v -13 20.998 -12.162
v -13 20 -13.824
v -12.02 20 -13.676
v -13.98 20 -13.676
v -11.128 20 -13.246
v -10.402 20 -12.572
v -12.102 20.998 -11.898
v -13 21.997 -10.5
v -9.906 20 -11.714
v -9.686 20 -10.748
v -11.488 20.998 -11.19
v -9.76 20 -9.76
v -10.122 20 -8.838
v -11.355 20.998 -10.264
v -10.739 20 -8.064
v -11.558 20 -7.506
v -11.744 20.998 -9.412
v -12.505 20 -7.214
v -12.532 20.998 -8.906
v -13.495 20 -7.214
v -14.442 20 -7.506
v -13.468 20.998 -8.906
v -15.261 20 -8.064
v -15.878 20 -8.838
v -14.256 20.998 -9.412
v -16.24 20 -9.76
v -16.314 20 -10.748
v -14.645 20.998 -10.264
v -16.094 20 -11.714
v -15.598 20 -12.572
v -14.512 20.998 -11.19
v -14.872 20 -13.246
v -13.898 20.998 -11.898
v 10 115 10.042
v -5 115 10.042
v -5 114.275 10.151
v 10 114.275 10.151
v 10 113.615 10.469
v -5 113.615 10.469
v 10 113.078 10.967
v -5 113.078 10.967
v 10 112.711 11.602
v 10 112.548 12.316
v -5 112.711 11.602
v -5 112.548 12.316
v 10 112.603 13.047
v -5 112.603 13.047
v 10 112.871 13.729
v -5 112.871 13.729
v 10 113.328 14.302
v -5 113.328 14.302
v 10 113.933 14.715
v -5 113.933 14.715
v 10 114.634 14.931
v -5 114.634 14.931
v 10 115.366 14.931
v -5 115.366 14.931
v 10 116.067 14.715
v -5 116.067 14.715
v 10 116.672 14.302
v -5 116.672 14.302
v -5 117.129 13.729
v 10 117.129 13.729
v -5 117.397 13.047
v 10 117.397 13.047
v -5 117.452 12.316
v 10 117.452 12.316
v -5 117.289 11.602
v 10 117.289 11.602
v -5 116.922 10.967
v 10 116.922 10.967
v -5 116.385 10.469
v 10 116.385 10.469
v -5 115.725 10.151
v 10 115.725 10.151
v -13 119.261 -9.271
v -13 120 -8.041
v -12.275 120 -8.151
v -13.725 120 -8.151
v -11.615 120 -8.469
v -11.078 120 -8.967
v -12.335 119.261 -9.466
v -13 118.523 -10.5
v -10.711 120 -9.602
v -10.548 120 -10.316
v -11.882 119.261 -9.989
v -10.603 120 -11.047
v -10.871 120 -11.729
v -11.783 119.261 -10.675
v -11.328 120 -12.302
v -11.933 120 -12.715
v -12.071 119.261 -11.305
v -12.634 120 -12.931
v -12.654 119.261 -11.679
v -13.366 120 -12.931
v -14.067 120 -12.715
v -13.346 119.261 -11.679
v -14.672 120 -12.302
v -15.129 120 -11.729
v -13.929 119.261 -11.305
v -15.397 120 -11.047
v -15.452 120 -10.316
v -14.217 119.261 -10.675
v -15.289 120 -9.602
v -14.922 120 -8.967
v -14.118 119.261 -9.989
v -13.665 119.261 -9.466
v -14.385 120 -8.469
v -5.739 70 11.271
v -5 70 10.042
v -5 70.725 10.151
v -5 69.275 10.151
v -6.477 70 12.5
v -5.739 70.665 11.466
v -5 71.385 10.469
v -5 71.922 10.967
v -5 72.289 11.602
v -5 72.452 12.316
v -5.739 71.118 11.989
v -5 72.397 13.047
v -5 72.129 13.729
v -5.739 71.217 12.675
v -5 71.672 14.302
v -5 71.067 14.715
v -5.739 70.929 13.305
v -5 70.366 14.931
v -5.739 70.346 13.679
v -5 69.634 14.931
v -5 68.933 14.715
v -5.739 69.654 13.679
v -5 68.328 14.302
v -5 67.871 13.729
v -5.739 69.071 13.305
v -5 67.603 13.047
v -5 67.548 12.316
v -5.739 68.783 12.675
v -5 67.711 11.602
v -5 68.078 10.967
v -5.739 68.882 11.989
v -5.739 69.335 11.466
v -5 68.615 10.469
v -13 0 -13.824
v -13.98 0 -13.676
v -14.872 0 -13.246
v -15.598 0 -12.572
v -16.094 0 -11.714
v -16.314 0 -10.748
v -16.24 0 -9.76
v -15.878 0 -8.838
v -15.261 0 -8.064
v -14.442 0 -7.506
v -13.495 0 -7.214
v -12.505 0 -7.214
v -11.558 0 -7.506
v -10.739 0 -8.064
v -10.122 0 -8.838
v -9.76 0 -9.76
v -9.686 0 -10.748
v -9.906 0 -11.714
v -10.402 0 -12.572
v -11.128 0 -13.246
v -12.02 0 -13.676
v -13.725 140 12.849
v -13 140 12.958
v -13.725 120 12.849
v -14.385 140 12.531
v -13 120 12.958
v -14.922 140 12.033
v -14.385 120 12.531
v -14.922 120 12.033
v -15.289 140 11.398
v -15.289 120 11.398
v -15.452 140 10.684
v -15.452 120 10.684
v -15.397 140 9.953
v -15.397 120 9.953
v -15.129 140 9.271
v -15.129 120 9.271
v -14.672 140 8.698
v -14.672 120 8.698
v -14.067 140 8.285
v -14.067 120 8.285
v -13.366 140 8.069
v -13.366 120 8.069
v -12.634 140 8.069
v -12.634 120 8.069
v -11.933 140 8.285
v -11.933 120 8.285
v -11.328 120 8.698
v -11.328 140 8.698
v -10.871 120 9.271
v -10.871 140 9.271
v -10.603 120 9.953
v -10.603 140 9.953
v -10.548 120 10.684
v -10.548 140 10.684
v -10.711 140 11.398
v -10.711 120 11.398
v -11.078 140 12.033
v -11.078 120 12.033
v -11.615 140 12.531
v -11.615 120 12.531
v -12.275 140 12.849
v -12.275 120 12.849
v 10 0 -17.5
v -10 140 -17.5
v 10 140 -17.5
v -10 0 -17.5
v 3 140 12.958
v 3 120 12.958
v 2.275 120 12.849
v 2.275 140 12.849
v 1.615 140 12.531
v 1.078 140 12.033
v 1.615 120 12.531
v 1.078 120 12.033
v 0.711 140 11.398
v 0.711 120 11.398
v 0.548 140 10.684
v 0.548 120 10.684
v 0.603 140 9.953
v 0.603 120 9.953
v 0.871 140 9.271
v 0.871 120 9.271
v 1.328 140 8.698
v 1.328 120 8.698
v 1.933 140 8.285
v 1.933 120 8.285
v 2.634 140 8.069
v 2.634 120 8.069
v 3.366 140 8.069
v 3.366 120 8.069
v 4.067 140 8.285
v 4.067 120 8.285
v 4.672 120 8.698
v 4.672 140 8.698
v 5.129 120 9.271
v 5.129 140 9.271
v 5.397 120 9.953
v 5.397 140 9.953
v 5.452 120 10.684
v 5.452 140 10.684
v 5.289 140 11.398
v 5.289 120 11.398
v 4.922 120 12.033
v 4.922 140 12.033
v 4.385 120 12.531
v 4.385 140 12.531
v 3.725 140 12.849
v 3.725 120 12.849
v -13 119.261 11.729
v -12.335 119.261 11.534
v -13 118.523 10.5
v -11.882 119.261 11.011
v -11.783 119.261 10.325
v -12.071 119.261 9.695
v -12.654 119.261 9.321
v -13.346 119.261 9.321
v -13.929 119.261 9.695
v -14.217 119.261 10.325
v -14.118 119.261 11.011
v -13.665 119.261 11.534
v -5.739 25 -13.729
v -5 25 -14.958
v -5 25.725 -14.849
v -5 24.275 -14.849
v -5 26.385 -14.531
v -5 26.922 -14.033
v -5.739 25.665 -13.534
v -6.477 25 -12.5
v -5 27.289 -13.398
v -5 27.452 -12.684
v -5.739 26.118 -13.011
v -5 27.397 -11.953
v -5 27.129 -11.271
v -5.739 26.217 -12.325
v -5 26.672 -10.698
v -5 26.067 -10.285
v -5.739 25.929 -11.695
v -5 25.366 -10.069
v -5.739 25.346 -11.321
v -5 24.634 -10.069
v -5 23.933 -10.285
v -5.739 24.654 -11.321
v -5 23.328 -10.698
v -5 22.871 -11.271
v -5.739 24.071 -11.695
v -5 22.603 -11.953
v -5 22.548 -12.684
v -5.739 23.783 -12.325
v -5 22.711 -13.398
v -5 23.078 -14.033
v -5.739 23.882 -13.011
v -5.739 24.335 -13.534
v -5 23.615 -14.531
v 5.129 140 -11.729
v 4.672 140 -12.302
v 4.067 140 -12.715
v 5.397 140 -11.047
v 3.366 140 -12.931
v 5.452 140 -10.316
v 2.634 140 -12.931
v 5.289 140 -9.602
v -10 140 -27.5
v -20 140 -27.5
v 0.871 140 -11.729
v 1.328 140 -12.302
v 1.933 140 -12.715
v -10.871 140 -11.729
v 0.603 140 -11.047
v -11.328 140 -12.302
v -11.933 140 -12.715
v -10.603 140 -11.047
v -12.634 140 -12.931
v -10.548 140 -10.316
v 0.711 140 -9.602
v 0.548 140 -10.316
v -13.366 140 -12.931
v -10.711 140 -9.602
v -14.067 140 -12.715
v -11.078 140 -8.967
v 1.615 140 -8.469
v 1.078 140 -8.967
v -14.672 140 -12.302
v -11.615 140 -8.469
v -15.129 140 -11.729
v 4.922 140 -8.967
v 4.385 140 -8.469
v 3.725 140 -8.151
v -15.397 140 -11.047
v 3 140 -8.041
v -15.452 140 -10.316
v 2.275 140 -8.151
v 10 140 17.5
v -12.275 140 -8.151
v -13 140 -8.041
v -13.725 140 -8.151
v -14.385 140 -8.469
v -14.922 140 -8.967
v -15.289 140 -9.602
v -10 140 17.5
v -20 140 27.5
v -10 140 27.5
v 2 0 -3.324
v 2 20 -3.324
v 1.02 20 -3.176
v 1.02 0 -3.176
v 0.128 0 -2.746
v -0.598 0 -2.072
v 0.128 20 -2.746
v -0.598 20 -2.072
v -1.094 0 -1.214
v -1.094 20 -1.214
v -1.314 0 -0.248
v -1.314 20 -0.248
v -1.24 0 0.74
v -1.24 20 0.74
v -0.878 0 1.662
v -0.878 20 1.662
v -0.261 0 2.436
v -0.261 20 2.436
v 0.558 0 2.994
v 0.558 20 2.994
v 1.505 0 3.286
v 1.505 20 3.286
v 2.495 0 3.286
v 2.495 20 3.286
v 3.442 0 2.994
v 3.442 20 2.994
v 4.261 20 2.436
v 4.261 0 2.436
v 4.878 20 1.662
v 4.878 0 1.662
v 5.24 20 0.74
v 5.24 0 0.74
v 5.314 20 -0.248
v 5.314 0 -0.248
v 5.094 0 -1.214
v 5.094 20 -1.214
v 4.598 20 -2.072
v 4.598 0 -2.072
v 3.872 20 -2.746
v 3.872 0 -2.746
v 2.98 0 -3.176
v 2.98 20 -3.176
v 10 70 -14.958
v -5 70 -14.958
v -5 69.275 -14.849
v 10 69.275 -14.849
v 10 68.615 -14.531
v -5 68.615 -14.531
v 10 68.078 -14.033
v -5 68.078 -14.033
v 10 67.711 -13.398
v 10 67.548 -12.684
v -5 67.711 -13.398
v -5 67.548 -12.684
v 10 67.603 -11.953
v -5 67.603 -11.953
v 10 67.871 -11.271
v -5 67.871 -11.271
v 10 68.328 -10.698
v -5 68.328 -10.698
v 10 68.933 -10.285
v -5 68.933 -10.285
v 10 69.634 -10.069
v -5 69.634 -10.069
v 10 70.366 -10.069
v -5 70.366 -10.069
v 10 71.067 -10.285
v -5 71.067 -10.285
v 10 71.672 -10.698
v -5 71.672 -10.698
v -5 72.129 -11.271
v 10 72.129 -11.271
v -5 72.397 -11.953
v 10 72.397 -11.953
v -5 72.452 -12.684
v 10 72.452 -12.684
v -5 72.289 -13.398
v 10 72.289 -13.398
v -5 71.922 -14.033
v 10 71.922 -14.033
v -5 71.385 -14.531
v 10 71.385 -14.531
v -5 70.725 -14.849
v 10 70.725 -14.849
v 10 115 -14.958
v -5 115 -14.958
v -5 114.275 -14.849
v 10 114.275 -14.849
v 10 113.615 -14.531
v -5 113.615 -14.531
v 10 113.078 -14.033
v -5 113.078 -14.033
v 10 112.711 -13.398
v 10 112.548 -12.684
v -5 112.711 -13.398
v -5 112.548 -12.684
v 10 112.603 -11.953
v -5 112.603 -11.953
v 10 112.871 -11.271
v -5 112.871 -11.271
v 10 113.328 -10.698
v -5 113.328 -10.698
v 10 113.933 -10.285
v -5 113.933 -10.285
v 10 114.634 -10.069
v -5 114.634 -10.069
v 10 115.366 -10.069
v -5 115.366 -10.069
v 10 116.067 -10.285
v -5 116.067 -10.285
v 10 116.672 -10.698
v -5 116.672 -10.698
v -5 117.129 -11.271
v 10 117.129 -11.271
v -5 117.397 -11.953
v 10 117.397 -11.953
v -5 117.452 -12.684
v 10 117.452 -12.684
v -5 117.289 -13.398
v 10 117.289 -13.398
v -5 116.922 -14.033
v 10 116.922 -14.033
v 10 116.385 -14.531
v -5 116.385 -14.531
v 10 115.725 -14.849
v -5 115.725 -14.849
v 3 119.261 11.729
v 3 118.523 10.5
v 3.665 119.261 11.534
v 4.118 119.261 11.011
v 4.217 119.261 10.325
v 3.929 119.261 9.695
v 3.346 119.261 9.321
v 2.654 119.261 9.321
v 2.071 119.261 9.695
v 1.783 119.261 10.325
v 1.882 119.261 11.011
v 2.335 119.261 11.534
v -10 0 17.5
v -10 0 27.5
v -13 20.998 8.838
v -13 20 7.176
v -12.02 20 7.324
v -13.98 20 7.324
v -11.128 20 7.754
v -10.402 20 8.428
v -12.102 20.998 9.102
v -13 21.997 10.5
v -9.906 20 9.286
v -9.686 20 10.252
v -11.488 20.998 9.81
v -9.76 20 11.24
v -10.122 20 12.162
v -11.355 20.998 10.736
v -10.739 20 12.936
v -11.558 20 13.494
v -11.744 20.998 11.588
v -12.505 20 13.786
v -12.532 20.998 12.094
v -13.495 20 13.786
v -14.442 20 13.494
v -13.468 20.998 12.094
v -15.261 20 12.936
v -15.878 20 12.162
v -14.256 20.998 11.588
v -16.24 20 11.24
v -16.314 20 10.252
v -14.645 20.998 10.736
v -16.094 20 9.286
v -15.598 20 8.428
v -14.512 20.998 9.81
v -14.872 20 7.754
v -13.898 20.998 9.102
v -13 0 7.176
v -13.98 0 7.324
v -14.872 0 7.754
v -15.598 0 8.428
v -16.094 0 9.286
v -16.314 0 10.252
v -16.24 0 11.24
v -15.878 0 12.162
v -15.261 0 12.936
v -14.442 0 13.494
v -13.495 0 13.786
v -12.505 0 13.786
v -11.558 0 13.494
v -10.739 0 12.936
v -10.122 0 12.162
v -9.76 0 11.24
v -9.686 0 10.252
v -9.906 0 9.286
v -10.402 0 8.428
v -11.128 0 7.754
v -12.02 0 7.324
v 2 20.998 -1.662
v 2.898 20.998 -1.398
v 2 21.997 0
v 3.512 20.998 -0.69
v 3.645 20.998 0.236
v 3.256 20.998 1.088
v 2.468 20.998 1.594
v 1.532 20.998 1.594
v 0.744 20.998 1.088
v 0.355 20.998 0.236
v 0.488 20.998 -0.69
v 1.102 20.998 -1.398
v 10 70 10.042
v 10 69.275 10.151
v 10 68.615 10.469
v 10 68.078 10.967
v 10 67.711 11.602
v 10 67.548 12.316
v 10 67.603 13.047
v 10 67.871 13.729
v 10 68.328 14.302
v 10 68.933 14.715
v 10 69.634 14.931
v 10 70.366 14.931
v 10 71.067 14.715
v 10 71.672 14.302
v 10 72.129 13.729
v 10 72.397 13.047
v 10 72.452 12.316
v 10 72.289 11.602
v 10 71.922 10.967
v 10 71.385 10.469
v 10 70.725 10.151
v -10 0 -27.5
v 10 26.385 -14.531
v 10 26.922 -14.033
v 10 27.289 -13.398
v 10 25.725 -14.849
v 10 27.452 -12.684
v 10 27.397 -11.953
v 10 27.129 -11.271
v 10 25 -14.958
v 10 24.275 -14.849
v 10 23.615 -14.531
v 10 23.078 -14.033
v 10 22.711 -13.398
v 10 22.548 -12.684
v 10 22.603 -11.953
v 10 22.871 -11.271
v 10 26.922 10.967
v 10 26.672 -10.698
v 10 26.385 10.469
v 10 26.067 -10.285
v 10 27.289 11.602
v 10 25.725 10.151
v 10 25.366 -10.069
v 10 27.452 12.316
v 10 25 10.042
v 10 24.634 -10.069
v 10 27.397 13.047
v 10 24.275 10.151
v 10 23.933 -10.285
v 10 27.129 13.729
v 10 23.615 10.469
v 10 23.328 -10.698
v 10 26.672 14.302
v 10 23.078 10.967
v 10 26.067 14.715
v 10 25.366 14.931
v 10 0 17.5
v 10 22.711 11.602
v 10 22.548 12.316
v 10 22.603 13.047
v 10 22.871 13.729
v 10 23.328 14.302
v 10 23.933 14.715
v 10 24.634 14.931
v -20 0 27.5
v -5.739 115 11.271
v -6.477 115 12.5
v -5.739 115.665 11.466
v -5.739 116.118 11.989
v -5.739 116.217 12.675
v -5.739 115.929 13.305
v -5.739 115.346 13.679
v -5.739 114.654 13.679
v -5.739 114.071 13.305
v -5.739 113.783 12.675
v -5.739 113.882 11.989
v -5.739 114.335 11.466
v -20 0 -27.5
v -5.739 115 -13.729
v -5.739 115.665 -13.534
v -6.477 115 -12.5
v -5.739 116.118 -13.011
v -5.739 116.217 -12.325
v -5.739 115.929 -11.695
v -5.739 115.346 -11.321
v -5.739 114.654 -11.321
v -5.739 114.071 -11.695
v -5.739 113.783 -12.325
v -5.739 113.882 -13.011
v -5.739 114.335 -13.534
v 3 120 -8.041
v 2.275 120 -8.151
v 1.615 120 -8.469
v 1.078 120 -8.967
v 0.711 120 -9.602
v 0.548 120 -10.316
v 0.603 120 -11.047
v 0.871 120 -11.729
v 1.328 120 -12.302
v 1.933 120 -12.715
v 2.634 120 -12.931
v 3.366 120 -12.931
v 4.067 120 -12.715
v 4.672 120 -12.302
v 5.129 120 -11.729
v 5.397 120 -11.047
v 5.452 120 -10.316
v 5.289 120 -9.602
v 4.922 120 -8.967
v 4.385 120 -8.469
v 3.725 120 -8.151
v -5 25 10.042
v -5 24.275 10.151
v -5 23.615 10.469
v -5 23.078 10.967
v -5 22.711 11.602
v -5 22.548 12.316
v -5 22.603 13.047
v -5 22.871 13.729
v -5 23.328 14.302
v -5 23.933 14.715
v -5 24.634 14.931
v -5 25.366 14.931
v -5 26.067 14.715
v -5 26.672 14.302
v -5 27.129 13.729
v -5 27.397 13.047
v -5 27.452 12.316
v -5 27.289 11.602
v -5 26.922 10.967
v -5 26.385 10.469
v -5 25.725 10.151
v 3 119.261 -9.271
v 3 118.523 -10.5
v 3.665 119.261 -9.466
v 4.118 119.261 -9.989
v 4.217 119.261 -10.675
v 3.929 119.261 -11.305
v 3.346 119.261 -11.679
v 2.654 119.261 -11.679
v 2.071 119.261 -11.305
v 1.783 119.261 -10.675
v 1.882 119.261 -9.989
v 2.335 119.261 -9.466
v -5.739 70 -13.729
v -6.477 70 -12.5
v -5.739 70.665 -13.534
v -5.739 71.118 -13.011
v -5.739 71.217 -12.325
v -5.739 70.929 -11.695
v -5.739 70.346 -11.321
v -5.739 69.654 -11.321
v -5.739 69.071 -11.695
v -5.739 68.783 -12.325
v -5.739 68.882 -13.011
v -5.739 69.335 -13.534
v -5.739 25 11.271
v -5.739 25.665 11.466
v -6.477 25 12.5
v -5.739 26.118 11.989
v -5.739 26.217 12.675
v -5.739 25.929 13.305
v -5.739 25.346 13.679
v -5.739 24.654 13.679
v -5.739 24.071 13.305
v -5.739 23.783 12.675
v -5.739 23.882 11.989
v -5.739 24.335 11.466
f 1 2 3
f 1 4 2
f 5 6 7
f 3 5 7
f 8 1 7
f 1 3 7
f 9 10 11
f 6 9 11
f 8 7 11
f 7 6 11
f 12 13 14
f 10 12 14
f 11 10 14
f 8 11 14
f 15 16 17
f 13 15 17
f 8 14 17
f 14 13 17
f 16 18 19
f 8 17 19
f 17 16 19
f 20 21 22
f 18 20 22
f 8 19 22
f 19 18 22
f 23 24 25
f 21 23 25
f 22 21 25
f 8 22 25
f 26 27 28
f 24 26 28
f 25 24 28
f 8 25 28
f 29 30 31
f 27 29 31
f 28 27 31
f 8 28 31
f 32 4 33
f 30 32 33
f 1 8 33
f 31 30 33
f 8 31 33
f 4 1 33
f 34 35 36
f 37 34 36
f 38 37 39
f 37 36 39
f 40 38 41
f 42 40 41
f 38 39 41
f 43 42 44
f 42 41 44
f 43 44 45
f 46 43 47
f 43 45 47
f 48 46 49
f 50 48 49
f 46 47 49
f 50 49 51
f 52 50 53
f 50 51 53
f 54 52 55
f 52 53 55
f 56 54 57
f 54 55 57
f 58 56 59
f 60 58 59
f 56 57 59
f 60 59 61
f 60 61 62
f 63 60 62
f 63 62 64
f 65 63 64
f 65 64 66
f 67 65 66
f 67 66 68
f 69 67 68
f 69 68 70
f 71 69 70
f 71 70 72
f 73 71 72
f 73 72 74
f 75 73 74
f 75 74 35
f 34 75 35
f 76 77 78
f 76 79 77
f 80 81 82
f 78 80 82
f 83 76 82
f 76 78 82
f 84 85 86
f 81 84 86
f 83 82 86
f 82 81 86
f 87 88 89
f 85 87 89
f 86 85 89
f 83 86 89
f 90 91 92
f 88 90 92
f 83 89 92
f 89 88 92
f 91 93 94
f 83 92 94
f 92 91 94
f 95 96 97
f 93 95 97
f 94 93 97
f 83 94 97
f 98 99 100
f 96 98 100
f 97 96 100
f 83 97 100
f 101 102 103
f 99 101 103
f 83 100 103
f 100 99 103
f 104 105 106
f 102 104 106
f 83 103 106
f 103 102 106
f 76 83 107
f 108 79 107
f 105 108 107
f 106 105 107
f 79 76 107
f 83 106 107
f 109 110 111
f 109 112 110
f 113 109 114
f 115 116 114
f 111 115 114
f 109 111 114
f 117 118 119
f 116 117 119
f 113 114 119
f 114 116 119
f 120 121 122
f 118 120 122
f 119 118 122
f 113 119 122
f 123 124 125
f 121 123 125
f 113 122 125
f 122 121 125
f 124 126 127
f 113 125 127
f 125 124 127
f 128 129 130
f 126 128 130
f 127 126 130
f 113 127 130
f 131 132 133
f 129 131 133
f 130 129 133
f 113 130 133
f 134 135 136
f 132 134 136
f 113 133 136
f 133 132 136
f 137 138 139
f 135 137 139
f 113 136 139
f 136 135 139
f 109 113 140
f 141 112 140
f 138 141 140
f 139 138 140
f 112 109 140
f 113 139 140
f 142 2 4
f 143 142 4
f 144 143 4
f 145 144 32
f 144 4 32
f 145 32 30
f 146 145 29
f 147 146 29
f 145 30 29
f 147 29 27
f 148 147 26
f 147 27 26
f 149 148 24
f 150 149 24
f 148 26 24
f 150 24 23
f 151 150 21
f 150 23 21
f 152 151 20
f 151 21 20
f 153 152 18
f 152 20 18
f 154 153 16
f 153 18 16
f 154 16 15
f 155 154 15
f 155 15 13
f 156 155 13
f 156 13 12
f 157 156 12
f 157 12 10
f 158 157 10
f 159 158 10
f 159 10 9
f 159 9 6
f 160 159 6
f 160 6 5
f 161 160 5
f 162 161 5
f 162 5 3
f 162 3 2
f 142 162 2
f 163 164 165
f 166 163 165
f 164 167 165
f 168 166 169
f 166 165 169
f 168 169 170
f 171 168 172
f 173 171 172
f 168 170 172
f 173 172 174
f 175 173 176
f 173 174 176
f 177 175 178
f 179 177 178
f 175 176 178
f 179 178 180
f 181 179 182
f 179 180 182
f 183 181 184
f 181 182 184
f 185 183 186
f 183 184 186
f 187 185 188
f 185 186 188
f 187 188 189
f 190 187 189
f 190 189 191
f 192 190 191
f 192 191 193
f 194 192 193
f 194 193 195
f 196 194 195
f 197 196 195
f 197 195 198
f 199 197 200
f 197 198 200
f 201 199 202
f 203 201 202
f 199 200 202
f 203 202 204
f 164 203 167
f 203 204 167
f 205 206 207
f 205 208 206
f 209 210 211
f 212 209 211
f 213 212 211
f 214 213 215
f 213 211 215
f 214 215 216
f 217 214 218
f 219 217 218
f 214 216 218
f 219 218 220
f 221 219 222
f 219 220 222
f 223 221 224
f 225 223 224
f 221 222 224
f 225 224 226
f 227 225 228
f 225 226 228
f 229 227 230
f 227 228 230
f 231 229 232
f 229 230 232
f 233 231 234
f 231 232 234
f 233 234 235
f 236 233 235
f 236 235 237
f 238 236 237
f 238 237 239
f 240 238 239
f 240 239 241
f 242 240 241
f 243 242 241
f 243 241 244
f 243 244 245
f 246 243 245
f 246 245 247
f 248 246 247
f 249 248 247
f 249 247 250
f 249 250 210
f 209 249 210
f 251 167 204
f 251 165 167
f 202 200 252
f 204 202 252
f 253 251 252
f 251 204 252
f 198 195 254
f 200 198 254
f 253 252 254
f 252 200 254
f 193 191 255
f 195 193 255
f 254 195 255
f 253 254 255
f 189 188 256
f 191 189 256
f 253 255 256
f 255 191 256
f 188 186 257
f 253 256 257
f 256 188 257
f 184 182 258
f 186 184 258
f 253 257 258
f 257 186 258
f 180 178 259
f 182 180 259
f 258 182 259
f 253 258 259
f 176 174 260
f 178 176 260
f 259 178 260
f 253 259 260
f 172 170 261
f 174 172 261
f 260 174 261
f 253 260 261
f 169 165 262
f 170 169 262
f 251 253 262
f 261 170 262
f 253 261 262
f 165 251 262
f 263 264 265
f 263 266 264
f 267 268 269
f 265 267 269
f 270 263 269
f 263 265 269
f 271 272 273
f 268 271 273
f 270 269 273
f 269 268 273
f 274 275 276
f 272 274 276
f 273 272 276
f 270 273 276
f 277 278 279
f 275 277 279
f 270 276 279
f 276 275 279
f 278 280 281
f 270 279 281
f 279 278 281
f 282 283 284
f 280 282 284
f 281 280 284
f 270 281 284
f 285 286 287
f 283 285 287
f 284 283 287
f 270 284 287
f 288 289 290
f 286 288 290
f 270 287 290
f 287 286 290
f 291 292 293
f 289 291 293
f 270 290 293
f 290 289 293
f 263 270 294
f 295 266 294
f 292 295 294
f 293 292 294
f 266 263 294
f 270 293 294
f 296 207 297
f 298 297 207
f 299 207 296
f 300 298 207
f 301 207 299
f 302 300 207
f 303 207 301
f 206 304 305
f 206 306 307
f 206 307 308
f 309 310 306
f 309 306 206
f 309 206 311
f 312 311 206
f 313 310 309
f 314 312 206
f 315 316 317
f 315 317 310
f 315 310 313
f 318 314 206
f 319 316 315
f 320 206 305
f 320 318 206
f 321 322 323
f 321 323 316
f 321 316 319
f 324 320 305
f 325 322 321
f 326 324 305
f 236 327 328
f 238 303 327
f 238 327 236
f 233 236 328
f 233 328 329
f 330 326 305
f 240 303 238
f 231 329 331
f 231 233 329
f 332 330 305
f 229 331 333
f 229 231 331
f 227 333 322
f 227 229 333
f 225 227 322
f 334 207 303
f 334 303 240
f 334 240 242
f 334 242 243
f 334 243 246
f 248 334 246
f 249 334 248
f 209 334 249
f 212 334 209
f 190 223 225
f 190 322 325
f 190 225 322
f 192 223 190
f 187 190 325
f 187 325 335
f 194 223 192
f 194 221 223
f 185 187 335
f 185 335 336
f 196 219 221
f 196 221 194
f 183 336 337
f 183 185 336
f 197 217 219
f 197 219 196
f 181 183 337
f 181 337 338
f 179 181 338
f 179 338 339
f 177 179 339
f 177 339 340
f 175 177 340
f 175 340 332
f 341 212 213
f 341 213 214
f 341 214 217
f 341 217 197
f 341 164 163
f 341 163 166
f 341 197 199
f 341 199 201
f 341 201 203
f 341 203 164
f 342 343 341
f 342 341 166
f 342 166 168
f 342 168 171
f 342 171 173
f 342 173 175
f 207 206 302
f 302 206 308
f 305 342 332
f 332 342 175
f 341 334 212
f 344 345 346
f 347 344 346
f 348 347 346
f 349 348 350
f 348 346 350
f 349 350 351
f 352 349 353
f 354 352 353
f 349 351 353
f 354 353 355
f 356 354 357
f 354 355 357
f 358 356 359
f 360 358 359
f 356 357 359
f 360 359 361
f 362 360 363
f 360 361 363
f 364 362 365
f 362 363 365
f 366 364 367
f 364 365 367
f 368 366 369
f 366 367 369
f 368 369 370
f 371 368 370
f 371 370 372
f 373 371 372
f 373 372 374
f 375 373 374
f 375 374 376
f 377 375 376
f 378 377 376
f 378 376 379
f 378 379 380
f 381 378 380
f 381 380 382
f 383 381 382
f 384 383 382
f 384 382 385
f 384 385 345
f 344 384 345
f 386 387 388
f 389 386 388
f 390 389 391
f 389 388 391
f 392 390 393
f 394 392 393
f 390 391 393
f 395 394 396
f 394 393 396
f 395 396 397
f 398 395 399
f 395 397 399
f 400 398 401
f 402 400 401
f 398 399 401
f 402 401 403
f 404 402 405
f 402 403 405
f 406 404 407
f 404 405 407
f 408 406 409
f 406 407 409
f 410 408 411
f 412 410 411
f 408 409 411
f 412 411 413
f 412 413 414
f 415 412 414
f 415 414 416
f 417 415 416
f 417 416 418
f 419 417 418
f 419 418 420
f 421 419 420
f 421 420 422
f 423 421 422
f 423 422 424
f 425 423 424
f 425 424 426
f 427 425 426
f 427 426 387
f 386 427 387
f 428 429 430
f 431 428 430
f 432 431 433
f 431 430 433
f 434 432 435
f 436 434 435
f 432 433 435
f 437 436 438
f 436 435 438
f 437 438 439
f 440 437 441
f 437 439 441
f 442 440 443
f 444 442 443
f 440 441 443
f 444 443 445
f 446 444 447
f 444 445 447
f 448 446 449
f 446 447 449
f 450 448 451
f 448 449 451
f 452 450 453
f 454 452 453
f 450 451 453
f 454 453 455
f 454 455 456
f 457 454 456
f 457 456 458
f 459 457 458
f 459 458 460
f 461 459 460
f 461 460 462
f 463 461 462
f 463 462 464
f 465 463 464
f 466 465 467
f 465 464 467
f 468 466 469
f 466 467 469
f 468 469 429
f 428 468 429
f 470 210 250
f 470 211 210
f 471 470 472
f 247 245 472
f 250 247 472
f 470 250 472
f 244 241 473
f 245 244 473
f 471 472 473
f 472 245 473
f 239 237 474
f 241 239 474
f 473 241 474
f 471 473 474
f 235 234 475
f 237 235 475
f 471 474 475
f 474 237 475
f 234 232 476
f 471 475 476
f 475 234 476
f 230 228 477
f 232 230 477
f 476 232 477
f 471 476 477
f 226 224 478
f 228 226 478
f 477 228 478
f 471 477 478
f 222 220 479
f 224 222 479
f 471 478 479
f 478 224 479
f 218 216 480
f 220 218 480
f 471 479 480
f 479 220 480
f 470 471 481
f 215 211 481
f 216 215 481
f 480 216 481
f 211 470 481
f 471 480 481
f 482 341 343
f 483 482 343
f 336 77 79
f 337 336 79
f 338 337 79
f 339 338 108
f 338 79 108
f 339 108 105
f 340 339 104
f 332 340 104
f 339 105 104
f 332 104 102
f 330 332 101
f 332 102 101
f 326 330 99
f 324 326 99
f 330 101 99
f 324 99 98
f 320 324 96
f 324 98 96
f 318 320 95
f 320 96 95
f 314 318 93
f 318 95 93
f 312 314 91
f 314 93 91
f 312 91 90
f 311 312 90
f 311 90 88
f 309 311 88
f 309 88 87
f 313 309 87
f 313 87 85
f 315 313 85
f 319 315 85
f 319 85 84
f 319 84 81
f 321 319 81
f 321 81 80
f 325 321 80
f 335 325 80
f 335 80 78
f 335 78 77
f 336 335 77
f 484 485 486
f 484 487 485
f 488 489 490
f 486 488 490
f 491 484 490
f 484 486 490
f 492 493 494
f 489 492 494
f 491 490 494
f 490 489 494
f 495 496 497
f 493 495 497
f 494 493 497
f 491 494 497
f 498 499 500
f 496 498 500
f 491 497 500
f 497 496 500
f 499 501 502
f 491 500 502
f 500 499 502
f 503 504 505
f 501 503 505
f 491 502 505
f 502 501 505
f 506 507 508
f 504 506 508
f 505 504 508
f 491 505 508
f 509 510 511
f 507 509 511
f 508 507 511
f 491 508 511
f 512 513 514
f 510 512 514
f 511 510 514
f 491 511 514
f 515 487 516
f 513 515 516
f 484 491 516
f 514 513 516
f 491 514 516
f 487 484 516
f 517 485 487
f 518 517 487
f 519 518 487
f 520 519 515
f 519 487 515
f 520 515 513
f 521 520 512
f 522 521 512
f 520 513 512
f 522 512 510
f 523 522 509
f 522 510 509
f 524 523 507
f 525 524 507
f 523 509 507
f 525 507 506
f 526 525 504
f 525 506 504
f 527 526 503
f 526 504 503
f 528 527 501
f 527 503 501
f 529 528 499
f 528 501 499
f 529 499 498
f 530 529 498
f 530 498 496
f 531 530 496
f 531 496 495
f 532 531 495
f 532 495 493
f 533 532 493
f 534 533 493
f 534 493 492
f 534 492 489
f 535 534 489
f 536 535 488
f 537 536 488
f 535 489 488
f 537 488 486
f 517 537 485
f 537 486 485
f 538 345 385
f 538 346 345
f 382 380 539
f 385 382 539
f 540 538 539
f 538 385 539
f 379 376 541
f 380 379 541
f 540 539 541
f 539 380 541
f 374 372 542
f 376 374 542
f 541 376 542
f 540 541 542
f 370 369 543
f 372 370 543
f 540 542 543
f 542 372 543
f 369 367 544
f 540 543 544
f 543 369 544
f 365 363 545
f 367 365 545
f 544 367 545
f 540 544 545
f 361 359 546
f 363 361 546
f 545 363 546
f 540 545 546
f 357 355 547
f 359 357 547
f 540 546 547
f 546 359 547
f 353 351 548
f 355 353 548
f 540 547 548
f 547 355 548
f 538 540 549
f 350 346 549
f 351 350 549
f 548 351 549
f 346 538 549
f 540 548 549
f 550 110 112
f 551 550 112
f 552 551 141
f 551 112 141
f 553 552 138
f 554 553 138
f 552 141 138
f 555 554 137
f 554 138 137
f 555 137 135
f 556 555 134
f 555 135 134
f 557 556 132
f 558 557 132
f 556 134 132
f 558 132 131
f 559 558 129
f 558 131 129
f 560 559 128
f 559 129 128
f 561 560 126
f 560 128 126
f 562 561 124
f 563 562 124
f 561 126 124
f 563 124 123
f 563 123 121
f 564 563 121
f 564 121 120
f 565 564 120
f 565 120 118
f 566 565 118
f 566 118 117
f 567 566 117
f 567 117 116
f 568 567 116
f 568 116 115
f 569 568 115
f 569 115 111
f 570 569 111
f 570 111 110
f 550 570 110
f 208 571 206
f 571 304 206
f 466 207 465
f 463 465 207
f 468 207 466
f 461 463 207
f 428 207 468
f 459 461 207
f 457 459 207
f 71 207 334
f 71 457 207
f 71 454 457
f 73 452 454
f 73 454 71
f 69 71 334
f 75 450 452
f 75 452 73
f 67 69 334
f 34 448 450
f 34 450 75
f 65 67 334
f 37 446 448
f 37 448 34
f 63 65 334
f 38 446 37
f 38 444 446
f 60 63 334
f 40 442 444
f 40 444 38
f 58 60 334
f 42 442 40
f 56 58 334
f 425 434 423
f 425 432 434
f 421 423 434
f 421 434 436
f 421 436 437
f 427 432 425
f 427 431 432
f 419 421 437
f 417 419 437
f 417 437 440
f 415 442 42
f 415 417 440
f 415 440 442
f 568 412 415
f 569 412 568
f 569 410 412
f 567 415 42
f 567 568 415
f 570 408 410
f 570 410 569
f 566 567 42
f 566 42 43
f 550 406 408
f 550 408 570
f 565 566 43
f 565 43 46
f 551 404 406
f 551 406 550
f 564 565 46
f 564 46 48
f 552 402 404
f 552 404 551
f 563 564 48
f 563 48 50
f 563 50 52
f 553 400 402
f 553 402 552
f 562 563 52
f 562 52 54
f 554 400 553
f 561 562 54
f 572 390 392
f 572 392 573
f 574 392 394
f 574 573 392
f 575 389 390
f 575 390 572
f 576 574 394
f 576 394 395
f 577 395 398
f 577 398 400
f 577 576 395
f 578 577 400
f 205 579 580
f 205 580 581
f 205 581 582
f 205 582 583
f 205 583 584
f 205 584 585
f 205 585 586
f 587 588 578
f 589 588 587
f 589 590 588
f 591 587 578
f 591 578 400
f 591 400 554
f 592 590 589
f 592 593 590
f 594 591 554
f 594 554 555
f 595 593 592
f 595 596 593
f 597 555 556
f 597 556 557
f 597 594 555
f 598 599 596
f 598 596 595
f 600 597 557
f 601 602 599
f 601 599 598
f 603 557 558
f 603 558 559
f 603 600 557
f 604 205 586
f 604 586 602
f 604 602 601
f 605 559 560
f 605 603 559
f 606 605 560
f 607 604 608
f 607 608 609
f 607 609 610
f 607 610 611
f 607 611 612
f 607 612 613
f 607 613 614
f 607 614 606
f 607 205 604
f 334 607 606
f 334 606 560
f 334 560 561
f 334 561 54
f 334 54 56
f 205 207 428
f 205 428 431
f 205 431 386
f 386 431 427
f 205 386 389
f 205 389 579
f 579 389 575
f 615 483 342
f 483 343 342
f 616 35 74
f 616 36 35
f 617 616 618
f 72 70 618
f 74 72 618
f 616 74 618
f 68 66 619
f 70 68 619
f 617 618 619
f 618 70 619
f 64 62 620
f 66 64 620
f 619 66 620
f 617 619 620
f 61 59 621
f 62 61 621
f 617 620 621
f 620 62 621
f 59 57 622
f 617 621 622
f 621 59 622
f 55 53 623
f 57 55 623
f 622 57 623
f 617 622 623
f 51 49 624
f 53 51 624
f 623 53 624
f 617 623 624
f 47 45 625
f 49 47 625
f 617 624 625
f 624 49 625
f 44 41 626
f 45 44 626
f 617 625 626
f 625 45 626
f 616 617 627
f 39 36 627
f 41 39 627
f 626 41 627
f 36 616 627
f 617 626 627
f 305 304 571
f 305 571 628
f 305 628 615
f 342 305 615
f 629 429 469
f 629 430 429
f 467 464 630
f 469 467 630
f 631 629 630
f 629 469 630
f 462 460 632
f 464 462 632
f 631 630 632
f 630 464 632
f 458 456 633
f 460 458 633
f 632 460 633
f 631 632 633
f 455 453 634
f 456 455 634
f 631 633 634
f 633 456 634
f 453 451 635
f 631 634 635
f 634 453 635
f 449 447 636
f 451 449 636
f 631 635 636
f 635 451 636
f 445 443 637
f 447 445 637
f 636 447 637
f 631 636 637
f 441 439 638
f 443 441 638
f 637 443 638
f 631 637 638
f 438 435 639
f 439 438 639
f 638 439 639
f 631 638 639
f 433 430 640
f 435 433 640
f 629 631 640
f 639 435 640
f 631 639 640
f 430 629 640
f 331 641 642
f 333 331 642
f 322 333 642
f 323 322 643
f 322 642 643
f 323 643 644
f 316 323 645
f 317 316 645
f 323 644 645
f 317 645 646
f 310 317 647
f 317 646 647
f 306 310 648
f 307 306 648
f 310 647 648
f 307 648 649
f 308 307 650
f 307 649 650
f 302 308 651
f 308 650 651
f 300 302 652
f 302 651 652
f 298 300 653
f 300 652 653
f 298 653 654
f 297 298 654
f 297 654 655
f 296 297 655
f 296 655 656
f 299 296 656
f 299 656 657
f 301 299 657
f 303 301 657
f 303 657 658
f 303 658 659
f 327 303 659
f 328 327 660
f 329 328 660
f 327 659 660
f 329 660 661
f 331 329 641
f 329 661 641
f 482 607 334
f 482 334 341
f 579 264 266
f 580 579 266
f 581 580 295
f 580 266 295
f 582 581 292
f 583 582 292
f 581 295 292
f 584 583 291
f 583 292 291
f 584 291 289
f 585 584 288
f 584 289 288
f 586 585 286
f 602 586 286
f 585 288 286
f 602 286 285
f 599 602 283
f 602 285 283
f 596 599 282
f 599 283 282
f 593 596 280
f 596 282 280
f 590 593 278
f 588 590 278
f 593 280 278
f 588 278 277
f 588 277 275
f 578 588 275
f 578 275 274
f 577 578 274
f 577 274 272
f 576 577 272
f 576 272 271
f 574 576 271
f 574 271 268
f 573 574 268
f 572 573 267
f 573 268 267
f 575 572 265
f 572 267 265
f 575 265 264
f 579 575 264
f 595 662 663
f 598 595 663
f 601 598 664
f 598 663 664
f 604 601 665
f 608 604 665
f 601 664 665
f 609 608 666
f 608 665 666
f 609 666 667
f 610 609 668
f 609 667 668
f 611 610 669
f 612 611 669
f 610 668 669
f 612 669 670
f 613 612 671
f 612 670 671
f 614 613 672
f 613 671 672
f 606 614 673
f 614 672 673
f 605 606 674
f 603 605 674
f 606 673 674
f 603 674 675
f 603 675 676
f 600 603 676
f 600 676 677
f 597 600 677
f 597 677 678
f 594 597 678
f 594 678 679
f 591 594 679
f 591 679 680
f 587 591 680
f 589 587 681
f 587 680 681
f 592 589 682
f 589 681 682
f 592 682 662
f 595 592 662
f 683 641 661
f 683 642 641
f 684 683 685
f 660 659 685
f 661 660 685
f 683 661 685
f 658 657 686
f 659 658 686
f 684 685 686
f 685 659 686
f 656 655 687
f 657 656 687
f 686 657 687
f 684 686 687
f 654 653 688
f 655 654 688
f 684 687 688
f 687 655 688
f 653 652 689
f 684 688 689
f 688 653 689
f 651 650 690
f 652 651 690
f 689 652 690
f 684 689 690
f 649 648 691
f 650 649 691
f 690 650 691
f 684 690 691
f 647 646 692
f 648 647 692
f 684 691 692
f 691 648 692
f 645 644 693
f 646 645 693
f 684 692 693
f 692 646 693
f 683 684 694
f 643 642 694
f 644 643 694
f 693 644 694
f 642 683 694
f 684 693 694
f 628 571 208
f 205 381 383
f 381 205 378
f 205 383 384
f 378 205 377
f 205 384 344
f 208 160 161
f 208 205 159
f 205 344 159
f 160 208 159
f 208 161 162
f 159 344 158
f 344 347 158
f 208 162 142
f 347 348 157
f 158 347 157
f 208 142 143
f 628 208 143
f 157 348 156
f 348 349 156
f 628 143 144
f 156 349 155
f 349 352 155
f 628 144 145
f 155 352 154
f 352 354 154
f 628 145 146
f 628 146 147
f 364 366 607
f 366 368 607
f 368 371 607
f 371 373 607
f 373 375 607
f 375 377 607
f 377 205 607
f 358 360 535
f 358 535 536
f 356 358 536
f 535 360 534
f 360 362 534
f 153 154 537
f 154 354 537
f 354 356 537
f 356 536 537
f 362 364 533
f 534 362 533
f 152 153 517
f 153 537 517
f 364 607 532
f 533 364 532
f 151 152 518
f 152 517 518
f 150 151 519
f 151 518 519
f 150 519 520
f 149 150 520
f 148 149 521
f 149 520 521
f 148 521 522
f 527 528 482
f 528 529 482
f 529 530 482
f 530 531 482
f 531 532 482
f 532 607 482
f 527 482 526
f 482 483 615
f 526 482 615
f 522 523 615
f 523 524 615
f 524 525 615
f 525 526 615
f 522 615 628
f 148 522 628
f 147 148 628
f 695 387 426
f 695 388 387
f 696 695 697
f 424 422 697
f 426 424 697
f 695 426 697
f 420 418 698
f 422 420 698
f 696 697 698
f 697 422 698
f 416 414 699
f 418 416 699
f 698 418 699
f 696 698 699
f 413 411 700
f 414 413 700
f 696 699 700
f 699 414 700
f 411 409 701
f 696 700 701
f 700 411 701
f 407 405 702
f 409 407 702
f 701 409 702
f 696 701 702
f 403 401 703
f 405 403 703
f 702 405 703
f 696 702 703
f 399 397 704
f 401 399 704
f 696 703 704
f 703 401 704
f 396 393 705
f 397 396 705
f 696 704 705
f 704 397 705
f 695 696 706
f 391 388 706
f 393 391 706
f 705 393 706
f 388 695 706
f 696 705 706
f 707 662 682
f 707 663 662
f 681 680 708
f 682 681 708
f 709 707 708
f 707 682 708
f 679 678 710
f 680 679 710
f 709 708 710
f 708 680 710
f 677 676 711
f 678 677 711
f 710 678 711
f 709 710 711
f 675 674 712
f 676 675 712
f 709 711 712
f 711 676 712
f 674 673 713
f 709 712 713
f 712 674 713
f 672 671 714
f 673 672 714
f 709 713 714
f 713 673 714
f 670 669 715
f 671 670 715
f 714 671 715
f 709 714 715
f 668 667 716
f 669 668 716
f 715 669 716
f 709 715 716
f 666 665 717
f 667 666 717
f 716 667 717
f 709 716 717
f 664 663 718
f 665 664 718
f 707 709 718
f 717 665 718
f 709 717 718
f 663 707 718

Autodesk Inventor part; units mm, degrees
ref_plane "YZ Plane" through (0, 0, 0) normal (1, 0, 0) x (0, 1, 0)
ref_plane "XZ Plane" through (0, 0, 0) normal (0, 1, 0) x (-1, 0, 0)
ref_plane "XY Plane" through (0, 0, 0) normal (0, 0, 1) x (1, 0, 0)
sketch "Sketch1" plane through (0, 0, 0) normal (0, 1, 0) x (-1, 0, 0)
  line L0 (-10, 17.5) -> (10, 17.5)
  line L1 (10, 17.5) -> (10, -17.5)
  line L2 (10, -17.5) -> (-10, -17.5)
  line L3 (-10, -17.5) -> (-10, 17.5)
  line L4 (-10, 17.5) -> (10, -17.5) construction
  line L5 (10, 17.5) -> (-10, -17.5) construction
  point P0 (0, 0)
  dimension "d0" = 35
  dimension "d1" = 20
extrude "Extrusion1" add sketch "Sketch1" along normal blind 140
sketch "Sketch2" plane through (0, 140, 0) normal (0, 1, 0) x (1, 0, 0)
  line L0 (-10, 27.5) -> (-10, -27.5)
  line L1 (-10, -27.5) -> (-20, -27.5)
  line L2 (-10, 27.5) -> (-20, 27.5)
  line L3 (-20, 27.5) -> (-20, -27.5)
  line L4 (-10, 17.5) -> (-10, -17.5) projected
  point P0 (0, 0)
  dimension "d4" = 55
  dimension "d5" = 0
  dimension "d6" = 10
  dimension "d7" = 27.5
extrude "Extrusion2" add sketch "Sketch2" against normal blind 140
sketch "Sketch3" plane through (0, 140, 0) normal (0, 1, 0) x (1, 0, 0)
  line L0 (10, -17.5) -> (10, 17.5) projected
  point P0 (0, 0)
  point P1 (3, -10.5)
  dimension "d10" = 7
  dimension "d11" = 10.5
hole "Hole1" at (3, 140, 10.5) direction (0, -1, 0) diameter 4.917 depth 20 tip angle 118 thread size "M6x1" class "6H" standard "ISO Metric profile"
pattern_linear "Rectangular Pattern1" count 2 spacing 16 along (-1, 0, 0) count 2 spacing 21 along (0, 0, -1) of "Hole1"
sketch "Sketch4" plane through (0, 0, 0) normal (0, -1, 0) x (1, 0, 0)
  line L0 (10, 17.5) -> (10, -17.5) projected
  point P0 (0, 0)
  point P1 (-13, -10.5)
  point P2 (-13, 10.5)
  point P3 (2, 0)
  dimension "d25" = 21
  dimension "d27" = 10.5
  dimension "d28" = 23
  dimension "d29" = 23
  dimension "d30" = 8
  dimension "d31" = 15
hole "Hole2" at (-13, 0, -10.5) at (-13, 0, 10.5) at (2, 0, 0) direction (0, 1, 0) diameter 6.647 depth 20 tip angle 118 thread size "M8x1.25" class "6H" standard "ISO Metric profile"
sketch "Sketch5" plane through (10, 0, 17.5) normal (1, 0, 0) x (0, 0, -1)
  line L0 (0, 0) -> (35, 0) projected
  point P0 (17.5, 0)
  point P1 (30, 25)
  point P2 (17.5, 0)
  point P3 (17.5, 0)
  dimension "d39" = 25
  dimension "d40" = 12.5
hole "Hole3" at (10, 25, -12.5) direction (-1, 0, 0) diameter 4.917 depth 15 tip angle 118 thread size "M6x1" class "6H" standard "ISO Metric profile"
pattern_linear "Rectangular Pattern2" count 2 spacing 25 along (0, 0, 1) count 3 spacing 45 along (0, 1, 0) of "Hole3"
properties part number "Fuhrung"
